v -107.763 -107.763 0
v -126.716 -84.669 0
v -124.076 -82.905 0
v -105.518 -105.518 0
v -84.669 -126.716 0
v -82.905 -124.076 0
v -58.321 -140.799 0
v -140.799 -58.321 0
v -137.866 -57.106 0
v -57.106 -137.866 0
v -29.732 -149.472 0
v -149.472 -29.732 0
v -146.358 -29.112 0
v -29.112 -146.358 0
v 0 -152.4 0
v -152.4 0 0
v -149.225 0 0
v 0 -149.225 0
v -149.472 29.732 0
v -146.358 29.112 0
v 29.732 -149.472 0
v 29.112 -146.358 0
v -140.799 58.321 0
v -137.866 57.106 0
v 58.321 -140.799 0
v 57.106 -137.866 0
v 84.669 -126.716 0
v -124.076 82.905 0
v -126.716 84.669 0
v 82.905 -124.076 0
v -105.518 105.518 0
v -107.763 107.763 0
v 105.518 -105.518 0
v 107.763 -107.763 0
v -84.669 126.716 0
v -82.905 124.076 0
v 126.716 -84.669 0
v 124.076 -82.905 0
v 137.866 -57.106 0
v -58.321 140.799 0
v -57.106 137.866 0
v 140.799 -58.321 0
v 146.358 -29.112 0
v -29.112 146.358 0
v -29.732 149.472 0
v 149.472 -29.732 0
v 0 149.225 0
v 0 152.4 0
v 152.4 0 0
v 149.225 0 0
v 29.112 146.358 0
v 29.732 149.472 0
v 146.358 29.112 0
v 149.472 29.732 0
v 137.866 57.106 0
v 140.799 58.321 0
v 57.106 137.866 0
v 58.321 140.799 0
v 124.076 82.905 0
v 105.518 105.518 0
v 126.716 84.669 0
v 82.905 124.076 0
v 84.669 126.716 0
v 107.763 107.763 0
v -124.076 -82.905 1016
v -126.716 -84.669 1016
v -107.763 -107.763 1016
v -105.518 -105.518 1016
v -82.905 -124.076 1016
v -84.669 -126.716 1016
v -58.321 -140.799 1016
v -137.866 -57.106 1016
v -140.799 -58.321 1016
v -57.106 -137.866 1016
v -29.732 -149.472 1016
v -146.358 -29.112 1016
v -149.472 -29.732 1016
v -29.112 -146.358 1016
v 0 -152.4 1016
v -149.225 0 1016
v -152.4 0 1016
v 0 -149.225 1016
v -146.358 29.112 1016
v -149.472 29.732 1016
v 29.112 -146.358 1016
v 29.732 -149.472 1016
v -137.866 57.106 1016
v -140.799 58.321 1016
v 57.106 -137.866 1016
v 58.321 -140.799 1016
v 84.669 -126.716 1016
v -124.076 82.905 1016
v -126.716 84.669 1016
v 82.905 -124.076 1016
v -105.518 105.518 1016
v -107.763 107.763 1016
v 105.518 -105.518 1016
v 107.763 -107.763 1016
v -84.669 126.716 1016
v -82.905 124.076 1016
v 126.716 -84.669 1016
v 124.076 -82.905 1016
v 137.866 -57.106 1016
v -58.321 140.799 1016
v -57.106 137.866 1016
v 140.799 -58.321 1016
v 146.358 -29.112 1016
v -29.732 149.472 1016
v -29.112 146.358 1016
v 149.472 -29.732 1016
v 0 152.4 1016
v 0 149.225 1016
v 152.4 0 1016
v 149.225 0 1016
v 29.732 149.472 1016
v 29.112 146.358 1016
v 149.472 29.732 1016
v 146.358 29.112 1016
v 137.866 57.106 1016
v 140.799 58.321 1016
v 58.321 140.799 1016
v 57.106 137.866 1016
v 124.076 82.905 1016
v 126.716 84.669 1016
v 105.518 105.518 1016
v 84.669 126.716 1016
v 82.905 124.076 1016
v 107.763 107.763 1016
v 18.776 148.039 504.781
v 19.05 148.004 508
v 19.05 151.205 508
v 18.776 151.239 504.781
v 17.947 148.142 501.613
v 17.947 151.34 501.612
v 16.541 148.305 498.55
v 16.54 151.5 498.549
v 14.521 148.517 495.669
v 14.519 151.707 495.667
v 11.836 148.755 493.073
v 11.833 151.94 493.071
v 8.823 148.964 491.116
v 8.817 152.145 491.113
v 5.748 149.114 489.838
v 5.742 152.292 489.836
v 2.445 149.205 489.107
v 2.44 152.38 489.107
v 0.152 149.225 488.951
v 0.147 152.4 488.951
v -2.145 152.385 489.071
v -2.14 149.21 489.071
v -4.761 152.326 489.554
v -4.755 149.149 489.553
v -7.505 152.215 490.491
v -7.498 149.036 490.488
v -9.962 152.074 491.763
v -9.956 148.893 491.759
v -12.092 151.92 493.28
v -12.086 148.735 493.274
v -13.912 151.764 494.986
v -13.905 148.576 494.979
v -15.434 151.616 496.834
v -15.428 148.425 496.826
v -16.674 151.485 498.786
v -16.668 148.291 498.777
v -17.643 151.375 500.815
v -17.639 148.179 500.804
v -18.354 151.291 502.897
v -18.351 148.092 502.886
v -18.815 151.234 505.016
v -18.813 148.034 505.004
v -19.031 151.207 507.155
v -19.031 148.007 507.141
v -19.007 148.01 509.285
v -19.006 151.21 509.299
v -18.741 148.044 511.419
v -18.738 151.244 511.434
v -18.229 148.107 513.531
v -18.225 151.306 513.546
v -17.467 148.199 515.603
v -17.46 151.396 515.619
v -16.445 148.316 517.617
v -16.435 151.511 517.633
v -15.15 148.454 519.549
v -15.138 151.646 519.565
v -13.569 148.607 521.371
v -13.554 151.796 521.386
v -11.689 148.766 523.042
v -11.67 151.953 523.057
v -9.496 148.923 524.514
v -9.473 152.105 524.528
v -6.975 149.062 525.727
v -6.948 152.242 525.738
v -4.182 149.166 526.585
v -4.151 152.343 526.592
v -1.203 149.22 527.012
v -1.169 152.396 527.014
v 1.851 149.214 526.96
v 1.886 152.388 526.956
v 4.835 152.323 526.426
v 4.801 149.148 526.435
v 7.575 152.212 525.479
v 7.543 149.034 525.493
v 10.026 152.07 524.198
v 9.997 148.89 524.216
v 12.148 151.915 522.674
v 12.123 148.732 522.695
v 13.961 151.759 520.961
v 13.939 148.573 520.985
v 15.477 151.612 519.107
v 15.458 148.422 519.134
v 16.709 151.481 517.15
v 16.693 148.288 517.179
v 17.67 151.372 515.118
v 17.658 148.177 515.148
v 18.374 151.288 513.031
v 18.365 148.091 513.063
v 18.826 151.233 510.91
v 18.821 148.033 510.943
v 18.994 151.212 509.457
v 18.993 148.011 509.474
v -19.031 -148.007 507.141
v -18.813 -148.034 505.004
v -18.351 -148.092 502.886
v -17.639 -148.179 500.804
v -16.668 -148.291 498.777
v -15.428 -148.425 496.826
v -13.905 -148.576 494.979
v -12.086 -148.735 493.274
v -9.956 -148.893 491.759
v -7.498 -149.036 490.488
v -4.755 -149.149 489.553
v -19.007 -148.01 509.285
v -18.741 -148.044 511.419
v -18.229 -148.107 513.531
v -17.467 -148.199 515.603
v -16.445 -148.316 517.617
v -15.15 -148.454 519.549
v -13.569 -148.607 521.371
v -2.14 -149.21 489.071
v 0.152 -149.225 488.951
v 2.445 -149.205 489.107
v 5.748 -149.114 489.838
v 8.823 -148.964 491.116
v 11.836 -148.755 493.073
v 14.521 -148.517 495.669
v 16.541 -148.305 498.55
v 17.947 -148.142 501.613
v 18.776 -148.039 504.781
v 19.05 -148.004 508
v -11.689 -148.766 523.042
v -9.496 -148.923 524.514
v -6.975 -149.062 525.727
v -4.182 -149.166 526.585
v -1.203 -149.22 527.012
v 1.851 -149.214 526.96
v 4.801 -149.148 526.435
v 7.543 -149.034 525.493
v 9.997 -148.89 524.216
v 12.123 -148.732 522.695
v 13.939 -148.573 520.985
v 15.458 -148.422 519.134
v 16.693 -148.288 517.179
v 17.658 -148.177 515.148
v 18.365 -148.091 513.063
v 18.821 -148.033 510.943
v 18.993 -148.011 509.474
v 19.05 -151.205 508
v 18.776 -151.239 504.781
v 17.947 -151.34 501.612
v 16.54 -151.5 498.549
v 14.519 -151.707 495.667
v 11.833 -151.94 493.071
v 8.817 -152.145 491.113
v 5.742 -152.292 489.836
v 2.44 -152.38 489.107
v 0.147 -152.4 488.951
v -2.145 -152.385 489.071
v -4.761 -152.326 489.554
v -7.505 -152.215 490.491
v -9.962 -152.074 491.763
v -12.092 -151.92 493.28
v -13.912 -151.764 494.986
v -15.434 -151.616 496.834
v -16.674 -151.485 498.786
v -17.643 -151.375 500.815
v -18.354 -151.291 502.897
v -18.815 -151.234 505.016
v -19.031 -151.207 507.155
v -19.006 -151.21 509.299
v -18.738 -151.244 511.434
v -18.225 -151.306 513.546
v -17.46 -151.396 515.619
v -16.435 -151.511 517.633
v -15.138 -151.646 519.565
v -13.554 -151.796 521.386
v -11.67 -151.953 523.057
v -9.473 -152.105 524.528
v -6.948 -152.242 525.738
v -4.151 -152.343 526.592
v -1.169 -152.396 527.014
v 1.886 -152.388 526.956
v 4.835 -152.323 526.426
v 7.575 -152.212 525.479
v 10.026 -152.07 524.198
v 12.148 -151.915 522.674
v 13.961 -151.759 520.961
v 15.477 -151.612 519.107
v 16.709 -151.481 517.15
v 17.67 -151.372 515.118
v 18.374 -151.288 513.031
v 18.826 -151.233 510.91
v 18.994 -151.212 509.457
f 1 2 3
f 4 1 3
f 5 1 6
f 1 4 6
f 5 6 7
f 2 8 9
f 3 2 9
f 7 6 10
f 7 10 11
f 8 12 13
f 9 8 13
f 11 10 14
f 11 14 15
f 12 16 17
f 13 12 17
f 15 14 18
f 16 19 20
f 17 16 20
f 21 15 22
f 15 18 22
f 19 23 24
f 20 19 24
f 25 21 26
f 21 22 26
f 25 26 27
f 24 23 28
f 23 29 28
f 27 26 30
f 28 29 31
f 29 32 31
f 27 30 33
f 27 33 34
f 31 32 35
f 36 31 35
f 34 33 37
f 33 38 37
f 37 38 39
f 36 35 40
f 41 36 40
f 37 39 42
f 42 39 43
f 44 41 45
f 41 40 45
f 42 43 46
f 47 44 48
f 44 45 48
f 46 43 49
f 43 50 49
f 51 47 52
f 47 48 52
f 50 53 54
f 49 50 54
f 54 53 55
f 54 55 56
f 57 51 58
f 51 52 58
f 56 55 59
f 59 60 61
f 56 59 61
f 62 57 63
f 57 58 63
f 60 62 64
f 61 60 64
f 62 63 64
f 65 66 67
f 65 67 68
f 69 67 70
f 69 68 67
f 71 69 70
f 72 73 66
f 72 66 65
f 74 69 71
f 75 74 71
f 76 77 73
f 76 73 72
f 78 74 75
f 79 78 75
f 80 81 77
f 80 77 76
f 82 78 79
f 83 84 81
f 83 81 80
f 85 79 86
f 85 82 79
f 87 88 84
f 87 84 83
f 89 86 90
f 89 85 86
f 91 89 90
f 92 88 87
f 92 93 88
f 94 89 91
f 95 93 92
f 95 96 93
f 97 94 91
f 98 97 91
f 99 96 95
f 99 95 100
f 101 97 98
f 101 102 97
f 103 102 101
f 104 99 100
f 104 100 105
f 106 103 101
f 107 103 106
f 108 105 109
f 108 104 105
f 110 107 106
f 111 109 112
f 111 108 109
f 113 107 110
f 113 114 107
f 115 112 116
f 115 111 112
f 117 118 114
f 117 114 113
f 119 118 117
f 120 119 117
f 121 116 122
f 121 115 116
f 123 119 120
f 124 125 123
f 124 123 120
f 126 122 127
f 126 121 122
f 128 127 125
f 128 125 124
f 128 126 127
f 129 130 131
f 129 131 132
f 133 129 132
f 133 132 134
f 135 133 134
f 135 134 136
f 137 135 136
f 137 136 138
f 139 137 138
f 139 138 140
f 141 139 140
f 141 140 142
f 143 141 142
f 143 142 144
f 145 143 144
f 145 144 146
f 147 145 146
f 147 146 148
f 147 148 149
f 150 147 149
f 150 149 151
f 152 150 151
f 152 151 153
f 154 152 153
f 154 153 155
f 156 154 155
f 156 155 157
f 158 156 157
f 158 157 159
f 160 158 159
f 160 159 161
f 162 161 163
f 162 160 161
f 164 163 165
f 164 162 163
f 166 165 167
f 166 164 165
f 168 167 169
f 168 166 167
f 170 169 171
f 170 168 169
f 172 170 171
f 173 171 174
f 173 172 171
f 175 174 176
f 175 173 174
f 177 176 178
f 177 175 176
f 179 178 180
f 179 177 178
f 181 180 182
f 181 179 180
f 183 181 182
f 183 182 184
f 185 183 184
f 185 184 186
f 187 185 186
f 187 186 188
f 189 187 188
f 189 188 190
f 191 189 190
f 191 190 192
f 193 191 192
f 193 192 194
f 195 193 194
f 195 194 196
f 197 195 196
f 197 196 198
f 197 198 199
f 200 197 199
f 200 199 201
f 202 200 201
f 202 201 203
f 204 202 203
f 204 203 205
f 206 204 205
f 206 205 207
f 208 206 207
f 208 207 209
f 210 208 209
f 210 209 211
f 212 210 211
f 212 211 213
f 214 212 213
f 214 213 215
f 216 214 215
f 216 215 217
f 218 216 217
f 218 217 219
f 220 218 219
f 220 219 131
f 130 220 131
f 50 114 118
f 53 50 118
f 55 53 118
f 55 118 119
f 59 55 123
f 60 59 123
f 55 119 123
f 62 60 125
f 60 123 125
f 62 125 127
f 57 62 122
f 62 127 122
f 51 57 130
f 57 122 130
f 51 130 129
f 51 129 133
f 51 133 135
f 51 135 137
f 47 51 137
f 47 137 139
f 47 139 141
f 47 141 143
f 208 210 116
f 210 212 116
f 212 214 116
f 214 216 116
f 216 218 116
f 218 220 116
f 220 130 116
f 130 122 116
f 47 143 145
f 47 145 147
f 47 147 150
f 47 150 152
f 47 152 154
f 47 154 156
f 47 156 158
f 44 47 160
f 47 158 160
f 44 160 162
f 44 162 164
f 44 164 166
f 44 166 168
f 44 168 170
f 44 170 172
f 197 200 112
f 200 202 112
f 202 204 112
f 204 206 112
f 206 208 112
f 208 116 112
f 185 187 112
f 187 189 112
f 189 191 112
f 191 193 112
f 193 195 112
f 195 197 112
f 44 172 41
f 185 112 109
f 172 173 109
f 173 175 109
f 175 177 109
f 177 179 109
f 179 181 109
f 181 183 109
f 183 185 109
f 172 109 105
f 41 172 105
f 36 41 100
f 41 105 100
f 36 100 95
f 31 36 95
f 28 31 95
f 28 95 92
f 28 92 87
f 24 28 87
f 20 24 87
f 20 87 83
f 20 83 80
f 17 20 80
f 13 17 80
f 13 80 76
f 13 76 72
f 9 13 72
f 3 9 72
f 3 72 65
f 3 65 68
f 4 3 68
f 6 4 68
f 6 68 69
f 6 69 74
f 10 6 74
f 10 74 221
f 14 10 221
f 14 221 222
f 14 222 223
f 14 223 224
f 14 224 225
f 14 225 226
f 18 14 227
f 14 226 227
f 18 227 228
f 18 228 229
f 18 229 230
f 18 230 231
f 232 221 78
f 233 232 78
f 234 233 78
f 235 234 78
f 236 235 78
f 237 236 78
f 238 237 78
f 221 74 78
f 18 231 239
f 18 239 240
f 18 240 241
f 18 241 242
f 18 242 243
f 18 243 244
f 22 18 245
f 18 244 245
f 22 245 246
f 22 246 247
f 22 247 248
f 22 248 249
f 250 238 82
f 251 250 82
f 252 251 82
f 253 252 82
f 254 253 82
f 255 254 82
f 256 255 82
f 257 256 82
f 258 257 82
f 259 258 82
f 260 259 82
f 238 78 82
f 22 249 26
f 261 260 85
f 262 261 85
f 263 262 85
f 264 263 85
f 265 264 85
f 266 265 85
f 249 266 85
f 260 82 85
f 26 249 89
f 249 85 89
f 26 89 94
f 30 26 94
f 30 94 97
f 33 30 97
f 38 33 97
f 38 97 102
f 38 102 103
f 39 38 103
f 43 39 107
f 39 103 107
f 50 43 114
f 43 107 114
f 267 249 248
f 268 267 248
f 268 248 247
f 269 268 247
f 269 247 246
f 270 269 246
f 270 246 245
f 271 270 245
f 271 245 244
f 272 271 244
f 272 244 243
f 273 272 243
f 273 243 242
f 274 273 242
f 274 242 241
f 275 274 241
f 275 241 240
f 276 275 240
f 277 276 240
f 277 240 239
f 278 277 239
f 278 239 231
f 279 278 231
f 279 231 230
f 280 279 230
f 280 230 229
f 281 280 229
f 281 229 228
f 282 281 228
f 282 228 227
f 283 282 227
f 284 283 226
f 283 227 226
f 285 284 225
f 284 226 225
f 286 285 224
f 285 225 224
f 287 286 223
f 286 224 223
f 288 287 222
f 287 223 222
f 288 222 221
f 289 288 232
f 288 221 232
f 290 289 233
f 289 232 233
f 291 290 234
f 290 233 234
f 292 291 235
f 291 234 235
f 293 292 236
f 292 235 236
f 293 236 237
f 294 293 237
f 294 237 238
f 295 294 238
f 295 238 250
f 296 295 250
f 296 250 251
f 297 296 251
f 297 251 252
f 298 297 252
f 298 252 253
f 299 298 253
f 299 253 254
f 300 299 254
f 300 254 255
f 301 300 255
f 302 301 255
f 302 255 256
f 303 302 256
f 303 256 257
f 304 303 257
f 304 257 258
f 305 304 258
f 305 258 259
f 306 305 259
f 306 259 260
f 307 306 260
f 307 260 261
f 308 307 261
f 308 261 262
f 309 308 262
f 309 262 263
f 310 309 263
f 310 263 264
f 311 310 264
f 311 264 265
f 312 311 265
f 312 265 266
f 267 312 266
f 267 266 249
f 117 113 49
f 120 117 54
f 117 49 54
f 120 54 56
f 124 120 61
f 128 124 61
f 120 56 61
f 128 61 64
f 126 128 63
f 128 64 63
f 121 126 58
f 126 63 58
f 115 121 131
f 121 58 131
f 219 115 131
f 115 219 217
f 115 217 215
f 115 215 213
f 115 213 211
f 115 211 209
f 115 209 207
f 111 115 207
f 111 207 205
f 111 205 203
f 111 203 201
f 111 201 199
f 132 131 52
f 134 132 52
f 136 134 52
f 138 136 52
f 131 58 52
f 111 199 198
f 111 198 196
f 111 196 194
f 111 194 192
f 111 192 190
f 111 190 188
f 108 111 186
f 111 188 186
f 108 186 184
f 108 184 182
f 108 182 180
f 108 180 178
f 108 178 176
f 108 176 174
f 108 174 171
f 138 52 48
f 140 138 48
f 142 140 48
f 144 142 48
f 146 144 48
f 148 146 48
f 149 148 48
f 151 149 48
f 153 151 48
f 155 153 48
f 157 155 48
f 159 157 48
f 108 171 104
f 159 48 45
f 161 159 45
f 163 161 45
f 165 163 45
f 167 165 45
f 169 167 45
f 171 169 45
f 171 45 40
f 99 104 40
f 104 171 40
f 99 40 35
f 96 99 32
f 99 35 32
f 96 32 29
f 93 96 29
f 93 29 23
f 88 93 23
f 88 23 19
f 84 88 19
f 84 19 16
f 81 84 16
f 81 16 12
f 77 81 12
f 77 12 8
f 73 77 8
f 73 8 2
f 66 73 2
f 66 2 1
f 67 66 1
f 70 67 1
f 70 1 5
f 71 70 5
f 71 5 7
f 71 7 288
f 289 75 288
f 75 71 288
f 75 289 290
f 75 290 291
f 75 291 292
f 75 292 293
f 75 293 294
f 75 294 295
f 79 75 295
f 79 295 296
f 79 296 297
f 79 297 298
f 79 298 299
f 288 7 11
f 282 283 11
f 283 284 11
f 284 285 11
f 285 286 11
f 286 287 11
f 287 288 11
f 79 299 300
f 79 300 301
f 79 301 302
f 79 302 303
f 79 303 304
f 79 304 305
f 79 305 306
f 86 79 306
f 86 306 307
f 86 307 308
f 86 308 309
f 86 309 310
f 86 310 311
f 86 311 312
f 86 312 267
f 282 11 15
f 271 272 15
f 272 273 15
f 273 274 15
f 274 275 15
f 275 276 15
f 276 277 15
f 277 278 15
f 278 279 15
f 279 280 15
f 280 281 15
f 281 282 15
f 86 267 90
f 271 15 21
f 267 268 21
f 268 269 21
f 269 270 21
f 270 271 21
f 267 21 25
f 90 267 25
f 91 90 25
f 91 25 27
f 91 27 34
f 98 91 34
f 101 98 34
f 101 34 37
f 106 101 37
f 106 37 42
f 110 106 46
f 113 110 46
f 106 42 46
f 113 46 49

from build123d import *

# Parameters (mm, degrees)
SKETCH1_R               = 152.4
BOSS_EXTRUDE1_DEPTH     = 1016
SKETCH2_R               = 149.225
CUT_EXTRUDE1_DEPTH      = 1016
SKETCH4_R               = 19.05
CUT_EXTRUDE3_DEPTH      = 441.96
CUT_EXTRUDE3_DEPTH_BACK = 459.754024061


with BuildPart() as part:
    # Sketch1 → Boss-Extrude1 (new body)
    with BuildSketch(Plane.XY):
        Circle(SKETCH1_R)
    extrude(amount=BOSS_EXTRUDE1_DEPTH)

    # Sketch2 → Cut-Extrude1 (cut)
    with BuildSketch(Plane.XY.offset(1016)):
        Circle(SKETCH2_R)
    extrude(amount=-CUT_EXTRUDE1_DEPTH, mode=Mode.SUBTRACT)

    # Sketch4 → Cut-Extrude3 (cut, two sides)
    with BuildSketch(Plane(origin=(0, 0, 0), x_dir=(1, 0, 0), z_dir=(0, 1, 0))) as cut_extrude3_sk:
        with Locations((0, -508)):
            Circle(SKETCH4_R)
    extrude(amount=CUT_EXTRUDE3_DEPTH, mode=Mode.SUBTRACT)
    extrude(cut_extrude3_sk.sketch, amount=-CUT_EXTRUDE3_DEPTH_BACK, mode=Mode.SUBTRACT)


solid = part.part
